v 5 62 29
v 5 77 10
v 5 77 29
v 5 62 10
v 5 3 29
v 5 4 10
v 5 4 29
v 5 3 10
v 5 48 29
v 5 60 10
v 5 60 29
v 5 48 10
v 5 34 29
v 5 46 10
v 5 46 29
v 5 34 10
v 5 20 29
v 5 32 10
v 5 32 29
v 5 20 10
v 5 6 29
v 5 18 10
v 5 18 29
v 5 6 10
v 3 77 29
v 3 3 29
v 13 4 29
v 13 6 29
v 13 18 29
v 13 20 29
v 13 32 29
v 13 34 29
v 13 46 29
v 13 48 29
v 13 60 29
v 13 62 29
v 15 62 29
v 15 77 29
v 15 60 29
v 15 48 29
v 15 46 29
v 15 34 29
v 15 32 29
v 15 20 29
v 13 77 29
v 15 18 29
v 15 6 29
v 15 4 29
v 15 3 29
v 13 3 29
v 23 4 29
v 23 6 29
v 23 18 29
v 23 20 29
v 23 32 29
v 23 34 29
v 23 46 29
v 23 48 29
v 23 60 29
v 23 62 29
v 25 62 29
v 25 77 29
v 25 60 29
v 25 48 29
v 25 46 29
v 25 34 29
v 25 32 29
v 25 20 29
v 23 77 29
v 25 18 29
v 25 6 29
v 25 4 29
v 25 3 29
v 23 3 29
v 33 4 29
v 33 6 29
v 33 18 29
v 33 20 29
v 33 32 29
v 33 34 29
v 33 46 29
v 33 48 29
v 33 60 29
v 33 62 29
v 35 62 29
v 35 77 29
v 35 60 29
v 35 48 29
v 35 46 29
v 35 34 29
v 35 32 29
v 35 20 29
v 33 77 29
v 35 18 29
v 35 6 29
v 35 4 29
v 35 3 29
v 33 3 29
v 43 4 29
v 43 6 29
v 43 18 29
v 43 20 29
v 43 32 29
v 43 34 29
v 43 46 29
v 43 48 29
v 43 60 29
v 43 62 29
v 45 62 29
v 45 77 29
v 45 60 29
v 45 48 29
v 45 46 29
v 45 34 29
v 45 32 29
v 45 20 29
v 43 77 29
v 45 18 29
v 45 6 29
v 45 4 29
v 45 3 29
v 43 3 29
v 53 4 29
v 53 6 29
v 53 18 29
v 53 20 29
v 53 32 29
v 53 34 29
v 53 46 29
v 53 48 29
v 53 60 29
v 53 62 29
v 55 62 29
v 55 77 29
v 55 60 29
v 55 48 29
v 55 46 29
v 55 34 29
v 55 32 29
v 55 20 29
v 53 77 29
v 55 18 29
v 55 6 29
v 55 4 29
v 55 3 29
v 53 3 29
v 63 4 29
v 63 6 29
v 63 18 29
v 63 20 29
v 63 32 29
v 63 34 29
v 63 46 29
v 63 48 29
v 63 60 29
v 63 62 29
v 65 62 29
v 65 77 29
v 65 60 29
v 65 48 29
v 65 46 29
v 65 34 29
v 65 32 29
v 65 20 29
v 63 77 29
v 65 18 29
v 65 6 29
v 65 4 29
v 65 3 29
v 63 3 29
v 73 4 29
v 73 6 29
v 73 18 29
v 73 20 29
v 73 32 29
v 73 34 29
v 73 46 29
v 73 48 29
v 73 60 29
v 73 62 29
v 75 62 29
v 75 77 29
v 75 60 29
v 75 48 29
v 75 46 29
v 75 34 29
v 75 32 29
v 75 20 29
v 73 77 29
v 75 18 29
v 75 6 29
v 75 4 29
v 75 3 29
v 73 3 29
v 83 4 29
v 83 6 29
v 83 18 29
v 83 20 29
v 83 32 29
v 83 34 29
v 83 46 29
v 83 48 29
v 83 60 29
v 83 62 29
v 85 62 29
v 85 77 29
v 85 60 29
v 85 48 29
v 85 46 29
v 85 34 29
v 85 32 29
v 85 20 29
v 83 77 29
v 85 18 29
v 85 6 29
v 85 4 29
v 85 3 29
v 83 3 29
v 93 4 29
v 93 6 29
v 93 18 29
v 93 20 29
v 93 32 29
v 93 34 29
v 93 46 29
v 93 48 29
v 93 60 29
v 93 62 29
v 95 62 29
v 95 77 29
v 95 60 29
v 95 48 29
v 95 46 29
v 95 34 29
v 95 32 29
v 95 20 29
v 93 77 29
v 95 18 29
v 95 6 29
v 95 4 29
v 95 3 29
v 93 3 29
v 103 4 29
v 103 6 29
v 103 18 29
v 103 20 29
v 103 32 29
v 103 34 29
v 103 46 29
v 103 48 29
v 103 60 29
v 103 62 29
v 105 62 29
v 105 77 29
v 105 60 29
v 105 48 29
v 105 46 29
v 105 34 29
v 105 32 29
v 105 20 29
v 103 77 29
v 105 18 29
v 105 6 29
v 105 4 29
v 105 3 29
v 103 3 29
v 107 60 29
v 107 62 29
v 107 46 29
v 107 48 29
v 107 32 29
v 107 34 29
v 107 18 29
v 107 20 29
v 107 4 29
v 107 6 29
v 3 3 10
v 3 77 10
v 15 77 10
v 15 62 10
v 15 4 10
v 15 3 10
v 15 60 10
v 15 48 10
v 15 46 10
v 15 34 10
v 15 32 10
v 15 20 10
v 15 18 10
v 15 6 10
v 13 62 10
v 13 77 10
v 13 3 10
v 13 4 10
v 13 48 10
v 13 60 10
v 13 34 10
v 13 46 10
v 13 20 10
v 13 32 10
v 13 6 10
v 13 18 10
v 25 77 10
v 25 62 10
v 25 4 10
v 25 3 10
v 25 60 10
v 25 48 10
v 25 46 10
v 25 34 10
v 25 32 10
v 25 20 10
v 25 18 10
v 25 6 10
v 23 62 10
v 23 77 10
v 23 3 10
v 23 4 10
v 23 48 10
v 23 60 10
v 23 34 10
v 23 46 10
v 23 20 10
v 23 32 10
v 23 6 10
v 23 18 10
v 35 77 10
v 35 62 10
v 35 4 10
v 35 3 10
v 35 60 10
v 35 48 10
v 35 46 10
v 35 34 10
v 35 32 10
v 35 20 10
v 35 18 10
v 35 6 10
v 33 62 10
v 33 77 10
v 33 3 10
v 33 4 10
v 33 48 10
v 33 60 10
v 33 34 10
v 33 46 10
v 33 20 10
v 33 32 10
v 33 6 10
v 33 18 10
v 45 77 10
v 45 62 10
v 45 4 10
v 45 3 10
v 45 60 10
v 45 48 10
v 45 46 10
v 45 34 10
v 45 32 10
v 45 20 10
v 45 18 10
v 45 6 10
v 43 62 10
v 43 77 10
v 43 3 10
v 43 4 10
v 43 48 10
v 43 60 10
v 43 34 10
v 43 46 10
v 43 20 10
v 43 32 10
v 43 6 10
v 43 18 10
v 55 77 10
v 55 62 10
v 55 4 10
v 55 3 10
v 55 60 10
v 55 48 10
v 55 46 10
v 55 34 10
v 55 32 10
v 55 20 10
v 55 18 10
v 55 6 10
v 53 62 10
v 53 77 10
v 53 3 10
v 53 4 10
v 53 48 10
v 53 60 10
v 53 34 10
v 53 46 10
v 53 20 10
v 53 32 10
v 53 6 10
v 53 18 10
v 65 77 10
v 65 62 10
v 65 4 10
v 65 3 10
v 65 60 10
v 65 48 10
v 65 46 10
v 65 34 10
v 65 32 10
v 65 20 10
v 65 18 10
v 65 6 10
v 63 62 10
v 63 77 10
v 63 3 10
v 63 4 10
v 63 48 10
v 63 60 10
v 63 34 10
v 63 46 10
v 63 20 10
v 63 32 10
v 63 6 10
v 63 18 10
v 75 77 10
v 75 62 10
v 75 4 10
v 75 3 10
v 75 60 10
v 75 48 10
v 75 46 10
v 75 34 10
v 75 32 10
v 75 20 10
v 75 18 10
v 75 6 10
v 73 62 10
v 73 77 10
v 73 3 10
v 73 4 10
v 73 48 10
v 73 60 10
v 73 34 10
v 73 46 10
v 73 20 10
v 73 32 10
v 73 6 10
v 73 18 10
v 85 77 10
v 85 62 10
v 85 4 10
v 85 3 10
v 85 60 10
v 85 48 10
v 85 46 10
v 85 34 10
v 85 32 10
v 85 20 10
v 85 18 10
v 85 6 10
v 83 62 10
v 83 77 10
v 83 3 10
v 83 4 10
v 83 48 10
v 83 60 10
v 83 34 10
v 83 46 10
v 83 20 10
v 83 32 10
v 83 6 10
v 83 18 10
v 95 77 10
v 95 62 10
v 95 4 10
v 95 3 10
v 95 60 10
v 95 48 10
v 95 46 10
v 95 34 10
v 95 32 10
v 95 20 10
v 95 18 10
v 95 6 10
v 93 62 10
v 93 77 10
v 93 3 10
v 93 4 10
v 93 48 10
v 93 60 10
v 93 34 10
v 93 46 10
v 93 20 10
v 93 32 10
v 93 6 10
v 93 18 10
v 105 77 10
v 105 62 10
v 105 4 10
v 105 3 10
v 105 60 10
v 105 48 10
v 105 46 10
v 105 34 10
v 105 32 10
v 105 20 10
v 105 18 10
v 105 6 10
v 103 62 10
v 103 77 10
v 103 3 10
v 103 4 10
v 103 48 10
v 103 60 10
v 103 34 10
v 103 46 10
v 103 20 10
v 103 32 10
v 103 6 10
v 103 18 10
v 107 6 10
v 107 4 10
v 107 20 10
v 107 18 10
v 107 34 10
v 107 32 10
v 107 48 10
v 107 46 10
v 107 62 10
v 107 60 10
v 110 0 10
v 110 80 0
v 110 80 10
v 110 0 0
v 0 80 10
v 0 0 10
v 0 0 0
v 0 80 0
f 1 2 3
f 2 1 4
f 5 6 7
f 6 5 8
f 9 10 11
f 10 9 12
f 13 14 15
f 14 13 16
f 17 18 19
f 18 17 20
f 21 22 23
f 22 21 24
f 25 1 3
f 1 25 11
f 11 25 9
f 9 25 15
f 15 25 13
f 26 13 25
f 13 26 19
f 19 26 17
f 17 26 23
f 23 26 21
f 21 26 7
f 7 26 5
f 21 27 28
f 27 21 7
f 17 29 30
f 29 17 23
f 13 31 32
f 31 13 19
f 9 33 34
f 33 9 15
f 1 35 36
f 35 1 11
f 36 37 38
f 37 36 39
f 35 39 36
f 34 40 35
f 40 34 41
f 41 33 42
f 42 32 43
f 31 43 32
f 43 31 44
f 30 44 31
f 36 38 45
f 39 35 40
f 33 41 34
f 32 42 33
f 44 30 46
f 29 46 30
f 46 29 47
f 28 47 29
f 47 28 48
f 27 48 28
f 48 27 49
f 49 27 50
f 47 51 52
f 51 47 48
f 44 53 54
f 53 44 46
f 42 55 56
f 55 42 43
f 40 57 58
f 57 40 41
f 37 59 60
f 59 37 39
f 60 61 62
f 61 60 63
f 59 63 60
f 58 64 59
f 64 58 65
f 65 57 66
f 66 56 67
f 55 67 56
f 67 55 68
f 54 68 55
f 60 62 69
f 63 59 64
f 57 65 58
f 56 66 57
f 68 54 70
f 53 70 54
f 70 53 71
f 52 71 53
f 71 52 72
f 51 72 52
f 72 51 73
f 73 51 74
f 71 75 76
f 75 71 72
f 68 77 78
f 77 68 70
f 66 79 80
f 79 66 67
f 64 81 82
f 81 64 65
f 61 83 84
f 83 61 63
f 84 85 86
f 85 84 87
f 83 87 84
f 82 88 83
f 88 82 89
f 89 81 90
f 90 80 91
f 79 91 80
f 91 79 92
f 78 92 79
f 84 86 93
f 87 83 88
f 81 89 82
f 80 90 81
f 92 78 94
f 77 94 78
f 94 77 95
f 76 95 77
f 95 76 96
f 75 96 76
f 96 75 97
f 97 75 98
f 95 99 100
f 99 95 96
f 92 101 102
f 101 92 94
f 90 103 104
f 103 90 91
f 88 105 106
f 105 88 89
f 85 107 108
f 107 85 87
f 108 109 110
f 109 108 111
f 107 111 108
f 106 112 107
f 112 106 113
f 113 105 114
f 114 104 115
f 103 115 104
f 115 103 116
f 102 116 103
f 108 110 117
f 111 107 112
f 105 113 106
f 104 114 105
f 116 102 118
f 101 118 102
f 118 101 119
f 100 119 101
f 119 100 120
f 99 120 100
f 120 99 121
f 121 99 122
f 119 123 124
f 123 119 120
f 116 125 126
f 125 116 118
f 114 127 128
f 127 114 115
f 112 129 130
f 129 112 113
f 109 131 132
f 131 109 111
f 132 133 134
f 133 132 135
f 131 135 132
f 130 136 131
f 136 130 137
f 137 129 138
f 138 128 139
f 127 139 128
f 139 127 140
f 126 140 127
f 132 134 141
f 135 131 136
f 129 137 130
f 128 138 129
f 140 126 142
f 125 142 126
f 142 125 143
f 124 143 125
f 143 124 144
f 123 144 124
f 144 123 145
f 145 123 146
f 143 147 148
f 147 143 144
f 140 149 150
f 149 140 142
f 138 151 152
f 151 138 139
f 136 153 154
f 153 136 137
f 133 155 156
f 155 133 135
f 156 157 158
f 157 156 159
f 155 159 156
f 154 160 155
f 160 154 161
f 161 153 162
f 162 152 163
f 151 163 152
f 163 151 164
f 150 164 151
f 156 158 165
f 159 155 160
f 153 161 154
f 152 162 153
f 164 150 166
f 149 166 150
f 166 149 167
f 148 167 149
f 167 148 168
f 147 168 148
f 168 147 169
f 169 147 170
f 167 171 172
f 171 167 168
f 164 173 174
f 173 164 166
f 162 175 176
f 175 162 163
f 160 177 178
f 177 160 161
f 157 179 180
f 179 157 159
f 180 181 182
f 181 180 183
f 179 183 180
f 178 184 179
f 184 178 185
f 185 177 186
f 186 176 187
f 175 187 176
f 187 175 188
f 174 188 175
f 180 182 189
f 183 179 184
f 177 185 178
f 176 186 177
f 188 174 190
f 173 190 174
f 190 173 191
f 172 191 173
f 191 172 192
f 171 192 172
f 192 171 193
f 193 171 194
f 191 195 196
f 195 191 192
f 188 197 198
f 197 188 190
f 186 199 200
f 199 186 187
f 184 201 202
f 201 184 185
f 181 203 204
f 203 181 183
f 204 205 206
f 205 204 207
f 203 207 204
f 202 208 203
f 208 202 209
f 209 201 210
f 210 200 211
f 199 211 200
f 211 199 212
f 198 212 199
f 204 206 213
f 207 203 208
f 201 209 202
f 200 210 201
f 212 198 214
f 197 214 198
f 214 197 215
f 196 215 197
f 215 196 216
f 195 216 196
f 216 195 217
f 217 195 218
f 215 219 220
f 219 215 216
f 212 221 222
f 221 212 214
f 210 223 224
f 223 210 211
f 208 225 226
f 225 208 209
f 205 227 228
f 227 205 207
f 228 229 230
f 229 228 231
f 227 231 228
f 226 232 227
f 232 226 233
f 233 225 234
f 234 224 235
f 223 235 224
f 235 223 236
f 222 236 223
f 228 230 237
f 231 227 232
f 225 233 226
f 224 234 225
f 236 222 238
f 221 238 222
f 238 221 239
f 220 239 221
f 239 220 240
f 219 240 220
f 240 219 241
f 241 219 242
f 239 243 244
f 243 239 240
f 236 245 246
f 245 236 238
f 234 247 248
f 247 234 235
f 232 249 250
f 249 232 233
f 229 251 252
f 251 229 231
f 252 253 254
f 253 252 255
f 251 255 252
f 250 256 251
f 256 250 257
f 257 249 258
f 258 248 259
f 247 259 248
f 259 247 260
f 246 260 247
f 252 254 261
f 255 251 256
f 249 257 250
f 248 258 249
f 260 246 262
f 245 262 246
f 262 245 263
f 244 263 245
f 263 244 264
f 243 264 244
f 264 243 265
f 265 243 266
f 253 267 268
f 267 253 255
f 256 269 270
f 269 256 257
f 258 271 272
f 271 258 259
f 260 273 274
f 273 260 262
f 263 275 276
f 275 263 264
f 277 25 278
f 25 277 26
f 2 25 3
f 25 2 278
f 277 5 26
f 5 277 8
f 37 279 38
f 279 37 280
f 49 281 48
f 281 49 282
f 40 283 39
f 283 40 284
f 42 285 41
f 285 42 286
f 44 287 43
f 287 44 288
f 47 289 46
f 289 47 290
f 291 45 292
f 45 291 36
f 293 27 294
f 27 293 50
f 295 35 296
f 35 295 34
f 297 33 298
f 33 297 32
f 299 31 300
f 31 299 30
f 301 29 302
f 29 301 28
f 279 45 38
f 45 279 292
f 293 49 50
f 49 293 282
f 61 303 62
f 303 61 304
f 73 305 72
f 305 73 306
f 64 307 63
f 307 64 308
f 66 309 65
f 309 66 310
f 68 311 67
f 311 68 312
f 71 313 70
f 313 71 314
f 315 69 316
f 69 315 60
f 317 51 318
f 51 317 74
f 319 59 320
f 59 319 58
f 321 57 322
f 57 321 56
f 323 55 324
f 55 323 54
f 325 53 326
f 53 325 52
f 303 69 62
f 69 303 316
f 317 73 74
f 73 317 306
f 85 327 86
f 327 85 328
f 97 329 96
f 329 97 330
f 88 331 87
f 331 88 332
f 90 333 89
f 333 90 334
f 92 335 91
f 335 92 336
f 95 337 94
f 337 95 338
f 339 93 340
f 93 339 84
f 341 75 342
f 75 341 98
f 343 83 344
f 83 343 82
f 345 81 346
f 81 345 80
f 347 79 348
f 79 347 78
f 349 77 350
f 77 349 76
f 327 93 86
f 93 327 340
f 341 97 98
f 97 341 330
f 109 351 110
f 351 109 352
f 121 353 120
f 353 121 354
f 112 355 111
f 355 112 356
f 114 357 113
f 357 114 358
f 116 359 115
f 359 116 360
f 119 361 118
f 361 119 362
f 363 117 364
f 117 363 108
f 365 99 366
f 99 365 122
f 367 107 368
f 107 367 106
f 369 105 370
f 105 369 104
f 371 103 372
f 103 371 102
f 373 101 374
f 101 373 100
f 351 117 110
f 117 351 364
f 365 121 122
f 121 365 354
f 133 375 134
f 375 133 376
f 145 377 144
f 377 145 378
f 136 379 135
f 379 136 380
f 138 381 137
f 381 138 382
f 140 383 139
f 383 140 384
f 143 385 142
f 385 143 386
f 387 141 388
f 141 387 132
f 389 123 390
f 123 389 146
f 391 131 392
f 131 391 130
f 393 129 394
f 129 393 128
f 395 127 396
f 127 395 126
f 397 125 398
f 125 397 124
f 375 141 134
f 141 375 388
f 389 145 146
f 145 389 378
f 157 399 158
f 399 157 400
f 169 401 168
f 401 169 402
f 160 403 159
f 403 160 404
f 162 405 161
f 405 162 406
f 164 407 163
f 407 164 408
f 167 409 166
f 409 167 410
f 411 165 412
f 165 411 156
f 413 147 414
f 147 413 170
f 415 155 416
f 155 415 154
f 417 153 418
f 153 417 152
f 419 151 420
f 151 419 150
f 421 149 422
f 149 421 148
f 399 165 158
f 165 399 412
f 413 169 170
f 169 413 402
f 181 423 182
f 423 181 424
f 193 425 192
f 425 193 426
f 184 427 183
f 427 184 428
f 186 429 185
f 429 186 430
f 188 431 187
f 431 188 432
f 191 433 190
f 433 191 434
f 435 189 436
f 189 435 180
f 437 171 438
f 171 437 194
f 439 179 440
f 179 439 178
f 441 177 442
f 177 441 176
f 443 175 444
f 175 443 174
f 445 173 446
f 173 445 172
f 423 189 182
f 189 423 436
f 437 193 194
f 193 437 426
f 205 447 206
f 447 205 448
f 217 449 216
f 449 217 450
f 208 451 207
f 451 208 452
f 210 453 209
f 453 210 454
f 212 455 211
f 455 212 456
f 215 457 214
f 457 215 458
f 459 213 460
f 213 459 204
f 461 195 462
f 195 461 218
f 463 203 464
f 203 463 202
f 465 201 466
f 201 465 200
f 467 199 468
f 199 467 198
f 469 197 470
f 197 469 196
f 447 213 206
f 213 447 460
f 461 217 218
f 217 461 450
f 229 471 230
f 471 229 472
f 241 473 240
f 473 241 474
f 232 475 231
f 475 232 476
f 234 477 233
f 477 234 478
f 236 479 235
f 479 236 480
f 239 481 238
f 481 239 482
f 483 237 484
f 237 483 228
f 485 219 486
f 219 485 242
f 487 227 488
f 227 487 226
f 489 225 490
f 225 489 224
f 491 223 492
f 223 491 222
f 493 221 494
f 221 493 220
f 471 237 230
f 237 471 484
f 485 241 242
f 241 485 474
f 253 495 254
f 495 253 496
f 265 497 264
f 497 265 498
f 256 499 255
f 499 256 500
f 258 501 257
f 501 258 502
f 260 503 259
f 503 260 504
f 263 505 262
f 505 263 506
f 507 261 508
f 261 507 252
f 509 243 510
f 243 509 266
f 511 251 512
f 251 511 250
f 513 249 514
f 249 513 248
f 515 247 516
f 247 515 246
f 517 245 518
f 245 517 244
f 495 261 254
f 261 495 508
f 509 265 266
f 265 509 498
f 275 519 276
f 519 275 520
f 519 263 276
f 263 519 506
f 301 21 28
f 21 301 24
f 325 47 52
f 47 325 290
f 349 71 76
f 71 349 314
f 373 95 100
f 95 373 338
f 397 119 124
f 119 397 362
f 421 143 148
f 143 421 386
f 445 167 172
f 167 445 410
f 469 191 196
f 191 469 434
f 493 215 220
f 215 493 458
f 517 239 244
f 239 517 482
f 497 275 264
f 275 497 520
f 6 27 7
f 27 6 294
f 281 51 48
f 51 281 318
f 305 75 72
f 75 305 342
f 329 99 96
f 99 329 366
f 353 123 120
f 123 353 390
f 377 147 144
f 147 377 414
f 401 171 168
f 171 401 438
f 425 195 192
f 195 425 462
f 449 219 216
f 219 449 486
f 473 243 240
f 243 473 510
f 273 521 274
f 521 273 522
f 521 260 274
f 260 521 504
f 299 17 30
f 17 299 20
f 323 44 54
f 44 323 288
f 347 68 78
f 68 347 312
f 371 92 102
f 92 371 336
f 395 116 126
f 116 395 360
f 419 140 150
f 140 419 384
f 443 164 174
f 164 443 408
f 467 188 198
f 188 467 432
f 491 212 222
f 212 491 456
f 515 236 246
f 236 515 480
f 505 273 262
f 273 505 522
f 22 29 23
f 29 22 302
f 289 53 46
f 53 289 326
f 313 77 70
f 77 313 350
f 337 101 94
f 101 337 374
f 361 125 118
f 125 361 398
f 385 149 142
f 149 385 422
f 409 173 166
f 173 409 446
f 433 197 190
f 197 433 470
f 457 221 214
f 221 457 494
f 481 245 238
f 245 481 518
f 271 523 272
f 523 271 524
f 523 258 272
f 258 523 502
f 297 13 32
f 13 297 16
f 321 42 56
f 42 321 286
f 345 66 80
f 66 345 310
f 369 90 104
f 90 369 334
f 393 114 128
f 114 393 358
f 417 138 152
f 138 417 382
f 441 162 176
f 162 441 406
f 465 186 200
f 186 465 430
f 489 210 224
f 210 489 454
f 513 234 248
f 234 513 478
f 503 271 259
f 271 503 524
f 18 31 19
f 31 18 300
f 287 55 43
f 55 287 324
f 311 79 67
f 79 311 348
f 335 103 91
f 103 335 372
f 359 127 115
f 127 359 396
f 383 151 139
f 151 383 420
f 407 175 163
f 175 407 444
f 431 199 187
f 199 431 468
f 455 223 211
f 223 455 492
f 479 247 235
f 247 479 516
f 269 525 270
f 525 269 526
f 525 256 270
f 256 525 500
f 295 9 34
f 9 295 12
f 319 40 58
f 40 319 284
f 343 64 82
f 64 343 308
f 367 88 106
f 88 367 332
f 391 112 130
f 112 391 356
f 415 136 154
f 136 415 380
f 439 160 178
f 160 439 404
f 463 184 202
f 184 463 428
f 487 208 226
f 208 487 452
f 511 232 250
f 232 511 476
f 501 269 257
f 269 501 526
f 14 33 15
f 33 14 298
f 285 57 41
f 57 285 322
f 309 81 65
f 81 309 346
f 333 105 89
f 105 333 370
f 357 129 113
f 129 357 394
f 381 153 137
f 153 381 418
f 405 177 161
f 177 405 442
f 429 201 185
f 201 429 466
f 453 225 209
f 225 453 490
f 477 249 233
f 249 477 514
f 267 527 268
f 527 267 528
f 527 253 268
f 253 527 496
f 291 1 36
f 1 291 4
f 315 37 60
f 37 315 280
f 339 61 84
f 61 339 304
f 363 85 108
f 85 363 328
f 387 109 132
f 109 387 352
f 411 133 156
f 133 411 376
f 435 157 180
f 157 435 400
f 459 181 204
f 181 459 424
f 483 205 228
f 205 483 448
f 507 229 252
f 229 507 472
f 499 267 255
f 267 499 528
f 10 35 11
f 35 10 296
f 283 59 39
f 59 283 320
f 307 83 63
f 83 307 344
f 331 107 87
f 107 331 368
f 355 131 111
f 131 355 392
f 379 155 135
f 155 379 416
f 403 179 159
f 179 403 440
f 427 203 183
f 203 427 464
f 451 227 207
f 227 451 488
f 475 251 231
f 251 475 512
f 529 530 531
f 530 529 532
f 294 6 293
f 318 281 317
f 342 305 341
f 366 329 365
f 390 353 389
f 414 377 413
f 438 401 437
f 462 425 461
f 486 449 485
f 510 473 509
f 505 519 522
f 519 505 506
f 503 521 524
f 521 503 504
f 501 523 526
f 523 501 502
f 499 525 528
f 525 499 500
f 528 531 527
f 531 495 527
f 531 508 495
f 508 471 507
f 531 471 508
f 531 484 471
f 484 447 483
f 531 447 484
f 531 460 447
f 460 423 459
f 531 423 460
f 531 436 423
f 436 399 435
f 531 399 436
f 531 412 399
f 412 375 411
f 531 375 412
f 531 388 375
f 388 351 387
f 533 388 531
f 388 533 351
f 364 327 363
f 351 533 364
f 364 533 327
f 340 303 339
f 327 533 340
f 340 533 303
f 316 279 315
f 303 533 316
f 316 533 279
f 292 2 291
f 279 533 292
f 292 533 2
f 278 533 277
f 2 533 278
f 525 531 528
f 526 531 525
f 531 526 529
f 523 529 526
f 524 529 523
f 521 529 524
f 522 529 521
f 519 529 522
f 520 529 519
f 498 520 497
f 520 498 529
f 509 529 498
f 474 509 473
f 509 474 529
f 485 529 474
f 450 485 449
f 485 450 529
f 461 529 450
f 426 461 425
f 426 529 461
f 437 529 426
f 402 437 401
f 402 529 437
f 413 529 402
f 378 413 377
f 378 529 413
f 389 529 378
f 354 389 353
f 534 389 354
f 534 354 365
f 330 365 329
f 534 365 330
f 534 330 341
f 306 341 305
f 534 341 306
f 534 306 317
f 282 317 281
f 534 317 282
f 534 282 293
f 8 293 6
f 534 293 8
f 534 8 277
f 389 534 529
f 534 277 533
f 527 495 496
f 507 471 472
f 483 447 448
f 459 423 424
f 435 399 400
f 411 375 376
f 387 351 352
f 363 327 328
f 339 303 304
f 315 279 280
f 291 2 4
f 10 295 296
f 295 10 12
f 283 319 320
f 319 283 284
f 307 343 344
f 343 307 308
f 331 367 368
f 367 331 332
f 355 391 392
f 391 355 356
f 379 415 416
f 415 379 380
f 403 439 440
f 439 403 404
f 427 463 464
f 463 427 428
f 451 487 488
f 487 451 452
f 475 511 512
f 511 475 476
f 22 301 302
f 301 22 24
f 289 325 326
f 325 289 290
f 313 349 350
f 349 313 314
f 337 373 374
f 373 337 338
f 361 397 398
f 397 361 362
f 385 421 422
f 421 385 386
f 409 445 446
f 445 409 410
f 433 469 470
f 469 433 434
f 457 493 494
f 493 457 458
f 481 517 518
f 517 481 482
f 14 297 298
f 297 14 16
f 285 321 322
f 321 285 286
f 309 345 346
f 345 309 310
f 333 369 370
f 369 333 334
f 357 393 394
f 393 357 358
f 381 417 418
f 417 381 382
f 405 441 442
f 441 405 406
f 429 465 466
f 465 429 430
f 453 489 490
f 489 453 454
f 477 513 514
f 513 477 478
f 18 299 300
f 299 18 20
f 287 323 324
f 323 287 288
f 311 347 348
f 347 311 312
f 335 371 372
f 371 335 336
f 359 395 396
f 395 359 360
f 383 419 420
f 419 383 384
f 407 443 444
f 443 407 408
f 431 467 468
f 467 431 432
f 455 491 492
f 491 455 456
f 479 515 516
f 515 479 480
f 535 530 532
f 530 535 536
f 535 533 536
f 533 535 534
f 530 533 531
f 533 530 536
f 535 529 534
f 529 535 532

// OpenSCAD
$fn = 32;

// ----------------------------------------------------------------------
// Heatsink: cross fin block
// ----------------------------------------------------------------------

// --- parameters (mm) ---
base_l = 110;             // base length, X
base_w = 80;              // base width, Y
base_t = 10;              // base plate thickness
fin_h = 20;               // fin height above the base
fin_t = 2;                // fin thickness
edge = 3;                 // margin from the base ends
pitch = 10;               // fin pitch
rib_pitch = 14;           // cross rib pitch
fit_tol = 0.05;           // tolerance for press fits, mm
free_tol = 0.3;           // tolerance for clearance fits, mm

n_fins = floor((base_l - 2 * edge - fin_t) / pitch) + 1;  // fin count
total_h = base_t + fin_h - 1;  // overall height
n_ribs = floor((base_w - 2 * edge) / rib_pitch);  // rib count

union() {
  cube([base_l, base_w, base_t]);
  for (i = [0 : n_fins - 1])
    translate([edge + i * pitch, edge, base_t - 1])
      cube([fin_t, base_w - 2 * edge, fin_h]);
  for (i = [0 : n_ribs - 1])
    translate([edge, edge + 1 + i * rib_pitch, base_t - 1])
      cube([base_l - 2 * edge, fin_t, fin_h]);
}
